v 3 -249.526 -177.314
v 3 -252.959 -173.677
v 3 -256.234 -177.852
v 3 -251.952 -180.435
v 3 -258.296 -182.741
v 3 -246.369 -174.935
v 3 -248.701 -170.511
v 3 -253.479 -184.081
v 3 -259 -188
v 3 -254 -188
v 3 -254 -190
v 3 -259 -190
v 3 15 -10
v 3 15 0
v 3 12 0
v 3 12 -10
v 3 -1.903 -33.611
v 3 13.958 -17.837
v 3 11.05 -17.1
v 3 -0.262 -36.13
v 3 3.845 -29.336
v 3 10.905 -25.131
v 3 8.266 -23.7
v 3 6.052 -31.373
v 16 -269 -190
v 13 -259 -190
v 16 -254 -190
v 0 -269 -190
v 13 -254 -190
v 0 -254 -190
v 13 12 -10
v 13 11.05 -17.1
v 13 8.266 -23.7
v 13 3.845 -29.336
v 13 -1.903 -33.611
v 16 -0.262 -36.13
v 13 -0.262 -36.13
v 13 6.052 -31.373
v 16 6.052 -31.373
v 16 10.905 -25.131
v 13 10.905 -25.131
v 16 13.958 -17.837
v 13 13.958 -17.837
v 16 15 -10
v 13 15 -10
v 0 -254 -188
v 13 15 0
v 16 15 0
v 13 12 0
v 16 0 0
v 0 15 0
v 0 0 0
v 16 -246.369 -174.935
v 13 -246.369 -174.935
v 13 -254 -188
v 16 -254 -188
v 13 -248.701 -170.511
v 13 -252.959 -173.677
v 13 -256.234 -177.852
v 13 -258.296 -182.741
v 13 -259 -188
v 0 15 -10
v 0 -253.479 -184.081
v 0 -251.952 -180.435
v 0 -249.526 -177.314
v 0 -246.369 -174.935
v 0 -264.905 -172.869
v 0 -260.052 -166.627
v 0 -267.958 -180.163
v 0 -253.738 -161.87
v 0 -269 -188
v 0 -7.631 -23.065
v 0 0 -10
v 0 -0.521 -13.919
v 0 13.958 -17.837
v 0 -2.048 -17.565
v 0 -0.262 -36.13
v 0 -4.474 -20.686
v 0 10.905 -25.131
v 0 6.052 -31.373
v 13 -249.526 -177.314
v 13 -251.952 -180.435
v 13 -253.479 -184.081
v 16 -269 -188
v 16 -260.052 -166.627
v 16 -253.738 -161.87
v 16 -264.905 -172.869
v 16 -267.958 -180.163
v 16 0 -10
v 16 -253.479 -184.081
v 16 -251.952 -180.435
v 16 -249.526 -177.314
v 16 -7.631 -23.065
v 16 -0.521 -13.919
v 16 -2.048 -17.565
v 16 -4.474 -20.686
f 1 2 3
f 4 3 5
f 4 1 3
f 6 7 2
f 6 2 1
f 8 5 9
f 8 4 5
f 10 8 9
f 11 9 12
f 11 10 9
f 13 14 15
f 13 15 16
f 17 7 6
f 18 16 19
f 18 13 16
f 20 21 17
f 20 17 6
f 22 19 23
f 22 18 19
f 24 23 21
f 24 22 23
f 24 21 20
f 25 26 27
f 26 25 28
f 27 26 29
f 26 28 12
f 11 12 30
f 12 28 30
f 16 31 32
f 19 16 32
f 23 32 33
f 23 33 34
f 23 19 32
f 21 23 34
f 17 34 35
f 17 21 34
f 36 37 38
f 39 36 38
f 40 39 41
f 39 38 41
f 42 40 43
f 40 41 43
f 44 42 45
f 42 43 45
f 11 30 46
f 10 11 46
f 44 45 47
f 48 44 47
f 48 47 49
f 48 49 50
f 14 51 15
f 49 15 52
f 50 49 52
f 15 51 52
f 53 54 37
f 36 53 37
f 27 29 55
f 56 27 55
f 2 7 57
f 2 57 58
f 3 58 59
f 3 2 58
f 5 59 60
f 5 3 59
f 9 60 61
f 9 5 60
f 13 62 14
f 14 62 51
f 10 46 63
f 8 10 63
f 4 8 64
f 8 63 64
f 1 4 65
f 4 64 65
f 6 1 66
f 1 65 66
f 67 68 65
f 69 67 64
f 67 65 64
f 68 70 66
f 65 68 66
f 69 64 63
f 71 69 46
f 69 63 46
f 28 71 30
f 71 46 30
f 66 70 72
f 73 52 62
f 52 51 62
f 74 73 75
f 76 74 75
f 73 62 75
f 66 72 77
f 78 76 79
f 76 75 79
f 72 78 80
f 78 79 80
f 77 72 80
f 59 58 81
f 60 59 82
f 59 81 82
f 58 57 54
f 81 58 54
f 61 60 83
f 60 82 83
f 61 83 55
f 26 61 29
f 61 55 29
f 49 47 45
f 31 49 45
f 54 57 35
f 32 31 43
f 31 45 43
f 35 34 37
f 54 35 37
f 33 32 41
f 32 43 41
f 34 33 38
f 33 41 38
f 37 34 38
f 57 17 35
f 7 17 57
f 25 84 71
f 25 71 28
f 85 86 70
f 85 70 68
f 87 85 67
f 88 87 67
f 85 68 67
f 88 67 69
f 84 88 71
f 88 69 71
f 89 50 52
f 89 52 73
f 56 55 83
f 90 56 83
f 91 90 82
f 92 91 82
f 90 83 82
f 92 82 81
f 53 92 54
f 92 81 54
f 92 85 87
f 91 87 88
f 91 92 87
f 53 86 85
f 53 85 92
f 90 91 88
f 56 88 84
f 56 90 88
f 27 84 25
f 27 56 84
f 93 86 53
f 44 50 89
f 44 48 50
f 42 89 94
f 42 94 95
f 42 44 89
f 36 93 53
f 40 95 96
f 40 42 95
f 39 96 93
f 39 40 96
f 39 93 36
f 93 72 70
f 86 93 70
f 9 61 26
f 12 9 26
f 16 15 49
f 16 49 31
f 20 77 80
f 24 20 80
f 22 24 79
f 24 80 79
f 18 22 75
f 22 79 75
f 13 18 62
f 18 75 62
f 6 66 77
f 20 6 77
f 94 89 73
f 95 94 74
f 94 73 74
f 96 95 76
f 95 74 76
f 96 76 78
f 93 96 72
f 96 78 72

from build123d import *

# Parameters (mm, degrees)
BOSS_EXTRUDE1_DEPTH = 16
CUT_EXTRUDE1_START  = -13
CUT_EXTRUDE1_DEPTH  = 10


with BuildPart() as part:
    # Sketch1 → Boss-Extrude1 (new body)
    with BuildSketch(Plane(origin=(0, 0, 0), x_dir=(0, 0, -1), z_dir=(1, 0, 0))):
        with BuildLine():
            Line((0, 0), (10, 0))
            ThreePointArc((10, 0), (17.565310247, -2.047545373), (23.065245029, -7.631189218))
            Line((23.065245029, -7.631189218), (161.869509942, -253.737621564))
            ThreePointArc((161.869509942, -253.737621564), (172.869379506, -264.904909254), (188, -269))
            Line((188, -269), (190, -269))
            Line((190, -269), (190, -254))
            Line((190, -254), (188, -254))
            ThreePointArc((188, -254), (180.434689753, -251.952454627), (174.934754971, -246.368810782))
            Line((174.934754971, -246.368810782), (36.130490058, -0.262378436))
            ThreePointArc((36.130490058, -0.262378436), (25.130620494, 10.904909254), (10, 15))
            Line((10, 15), (0, 15))
            Line((0, 15), (0, 0))
        make_face()
    extrude(amount=BOSS_EXTRUDE1_DEPTH)

    # Sketch3 → Cut-Extrude1 (cut)
    with BuildSketch(Plane(origin=(16, 0, 0), x_dir=(0, 0, -1), z_dir=(1, 0, 0)).offset(CUT_EXTRUDE1_START)):
        with BuildLine():
            Line((10, 15), (0, 15))
            Line((0, 15), (0, 12))
            Line((0, 12), (10, 12))
            ThreePointArc((10, 12), (23.700034196, 8.26604958), (33.610790729, -1.903032367))
            Line((33.610790729, -1.903032367), (170.510525386, -248.701457506))
            ThreePointArc((170.510525386, -248.701457506), (177.851826522, -256.2341108), (188, -259))
            Line((188, -259), (190, -259))
            Line((190, -259), (190, -254))
            Line((190, -254), (188, -254))
            ThreePointArc((188, -254), (180.434689753, -251.952454627), (174.934754971, -246.368810782))
            Line((174.934754971, -246.368810782), (36.130490058, -0.262378436))
            ThreePointArc((36.130490058, -0.262378436), (25.130620494, 10.904909254), (10, 15))
        make_face()
    extrude(amount=CUT_EXTRUDE1_DEPTH, mode=Mode.SUBTRACT)


solid = part.part
